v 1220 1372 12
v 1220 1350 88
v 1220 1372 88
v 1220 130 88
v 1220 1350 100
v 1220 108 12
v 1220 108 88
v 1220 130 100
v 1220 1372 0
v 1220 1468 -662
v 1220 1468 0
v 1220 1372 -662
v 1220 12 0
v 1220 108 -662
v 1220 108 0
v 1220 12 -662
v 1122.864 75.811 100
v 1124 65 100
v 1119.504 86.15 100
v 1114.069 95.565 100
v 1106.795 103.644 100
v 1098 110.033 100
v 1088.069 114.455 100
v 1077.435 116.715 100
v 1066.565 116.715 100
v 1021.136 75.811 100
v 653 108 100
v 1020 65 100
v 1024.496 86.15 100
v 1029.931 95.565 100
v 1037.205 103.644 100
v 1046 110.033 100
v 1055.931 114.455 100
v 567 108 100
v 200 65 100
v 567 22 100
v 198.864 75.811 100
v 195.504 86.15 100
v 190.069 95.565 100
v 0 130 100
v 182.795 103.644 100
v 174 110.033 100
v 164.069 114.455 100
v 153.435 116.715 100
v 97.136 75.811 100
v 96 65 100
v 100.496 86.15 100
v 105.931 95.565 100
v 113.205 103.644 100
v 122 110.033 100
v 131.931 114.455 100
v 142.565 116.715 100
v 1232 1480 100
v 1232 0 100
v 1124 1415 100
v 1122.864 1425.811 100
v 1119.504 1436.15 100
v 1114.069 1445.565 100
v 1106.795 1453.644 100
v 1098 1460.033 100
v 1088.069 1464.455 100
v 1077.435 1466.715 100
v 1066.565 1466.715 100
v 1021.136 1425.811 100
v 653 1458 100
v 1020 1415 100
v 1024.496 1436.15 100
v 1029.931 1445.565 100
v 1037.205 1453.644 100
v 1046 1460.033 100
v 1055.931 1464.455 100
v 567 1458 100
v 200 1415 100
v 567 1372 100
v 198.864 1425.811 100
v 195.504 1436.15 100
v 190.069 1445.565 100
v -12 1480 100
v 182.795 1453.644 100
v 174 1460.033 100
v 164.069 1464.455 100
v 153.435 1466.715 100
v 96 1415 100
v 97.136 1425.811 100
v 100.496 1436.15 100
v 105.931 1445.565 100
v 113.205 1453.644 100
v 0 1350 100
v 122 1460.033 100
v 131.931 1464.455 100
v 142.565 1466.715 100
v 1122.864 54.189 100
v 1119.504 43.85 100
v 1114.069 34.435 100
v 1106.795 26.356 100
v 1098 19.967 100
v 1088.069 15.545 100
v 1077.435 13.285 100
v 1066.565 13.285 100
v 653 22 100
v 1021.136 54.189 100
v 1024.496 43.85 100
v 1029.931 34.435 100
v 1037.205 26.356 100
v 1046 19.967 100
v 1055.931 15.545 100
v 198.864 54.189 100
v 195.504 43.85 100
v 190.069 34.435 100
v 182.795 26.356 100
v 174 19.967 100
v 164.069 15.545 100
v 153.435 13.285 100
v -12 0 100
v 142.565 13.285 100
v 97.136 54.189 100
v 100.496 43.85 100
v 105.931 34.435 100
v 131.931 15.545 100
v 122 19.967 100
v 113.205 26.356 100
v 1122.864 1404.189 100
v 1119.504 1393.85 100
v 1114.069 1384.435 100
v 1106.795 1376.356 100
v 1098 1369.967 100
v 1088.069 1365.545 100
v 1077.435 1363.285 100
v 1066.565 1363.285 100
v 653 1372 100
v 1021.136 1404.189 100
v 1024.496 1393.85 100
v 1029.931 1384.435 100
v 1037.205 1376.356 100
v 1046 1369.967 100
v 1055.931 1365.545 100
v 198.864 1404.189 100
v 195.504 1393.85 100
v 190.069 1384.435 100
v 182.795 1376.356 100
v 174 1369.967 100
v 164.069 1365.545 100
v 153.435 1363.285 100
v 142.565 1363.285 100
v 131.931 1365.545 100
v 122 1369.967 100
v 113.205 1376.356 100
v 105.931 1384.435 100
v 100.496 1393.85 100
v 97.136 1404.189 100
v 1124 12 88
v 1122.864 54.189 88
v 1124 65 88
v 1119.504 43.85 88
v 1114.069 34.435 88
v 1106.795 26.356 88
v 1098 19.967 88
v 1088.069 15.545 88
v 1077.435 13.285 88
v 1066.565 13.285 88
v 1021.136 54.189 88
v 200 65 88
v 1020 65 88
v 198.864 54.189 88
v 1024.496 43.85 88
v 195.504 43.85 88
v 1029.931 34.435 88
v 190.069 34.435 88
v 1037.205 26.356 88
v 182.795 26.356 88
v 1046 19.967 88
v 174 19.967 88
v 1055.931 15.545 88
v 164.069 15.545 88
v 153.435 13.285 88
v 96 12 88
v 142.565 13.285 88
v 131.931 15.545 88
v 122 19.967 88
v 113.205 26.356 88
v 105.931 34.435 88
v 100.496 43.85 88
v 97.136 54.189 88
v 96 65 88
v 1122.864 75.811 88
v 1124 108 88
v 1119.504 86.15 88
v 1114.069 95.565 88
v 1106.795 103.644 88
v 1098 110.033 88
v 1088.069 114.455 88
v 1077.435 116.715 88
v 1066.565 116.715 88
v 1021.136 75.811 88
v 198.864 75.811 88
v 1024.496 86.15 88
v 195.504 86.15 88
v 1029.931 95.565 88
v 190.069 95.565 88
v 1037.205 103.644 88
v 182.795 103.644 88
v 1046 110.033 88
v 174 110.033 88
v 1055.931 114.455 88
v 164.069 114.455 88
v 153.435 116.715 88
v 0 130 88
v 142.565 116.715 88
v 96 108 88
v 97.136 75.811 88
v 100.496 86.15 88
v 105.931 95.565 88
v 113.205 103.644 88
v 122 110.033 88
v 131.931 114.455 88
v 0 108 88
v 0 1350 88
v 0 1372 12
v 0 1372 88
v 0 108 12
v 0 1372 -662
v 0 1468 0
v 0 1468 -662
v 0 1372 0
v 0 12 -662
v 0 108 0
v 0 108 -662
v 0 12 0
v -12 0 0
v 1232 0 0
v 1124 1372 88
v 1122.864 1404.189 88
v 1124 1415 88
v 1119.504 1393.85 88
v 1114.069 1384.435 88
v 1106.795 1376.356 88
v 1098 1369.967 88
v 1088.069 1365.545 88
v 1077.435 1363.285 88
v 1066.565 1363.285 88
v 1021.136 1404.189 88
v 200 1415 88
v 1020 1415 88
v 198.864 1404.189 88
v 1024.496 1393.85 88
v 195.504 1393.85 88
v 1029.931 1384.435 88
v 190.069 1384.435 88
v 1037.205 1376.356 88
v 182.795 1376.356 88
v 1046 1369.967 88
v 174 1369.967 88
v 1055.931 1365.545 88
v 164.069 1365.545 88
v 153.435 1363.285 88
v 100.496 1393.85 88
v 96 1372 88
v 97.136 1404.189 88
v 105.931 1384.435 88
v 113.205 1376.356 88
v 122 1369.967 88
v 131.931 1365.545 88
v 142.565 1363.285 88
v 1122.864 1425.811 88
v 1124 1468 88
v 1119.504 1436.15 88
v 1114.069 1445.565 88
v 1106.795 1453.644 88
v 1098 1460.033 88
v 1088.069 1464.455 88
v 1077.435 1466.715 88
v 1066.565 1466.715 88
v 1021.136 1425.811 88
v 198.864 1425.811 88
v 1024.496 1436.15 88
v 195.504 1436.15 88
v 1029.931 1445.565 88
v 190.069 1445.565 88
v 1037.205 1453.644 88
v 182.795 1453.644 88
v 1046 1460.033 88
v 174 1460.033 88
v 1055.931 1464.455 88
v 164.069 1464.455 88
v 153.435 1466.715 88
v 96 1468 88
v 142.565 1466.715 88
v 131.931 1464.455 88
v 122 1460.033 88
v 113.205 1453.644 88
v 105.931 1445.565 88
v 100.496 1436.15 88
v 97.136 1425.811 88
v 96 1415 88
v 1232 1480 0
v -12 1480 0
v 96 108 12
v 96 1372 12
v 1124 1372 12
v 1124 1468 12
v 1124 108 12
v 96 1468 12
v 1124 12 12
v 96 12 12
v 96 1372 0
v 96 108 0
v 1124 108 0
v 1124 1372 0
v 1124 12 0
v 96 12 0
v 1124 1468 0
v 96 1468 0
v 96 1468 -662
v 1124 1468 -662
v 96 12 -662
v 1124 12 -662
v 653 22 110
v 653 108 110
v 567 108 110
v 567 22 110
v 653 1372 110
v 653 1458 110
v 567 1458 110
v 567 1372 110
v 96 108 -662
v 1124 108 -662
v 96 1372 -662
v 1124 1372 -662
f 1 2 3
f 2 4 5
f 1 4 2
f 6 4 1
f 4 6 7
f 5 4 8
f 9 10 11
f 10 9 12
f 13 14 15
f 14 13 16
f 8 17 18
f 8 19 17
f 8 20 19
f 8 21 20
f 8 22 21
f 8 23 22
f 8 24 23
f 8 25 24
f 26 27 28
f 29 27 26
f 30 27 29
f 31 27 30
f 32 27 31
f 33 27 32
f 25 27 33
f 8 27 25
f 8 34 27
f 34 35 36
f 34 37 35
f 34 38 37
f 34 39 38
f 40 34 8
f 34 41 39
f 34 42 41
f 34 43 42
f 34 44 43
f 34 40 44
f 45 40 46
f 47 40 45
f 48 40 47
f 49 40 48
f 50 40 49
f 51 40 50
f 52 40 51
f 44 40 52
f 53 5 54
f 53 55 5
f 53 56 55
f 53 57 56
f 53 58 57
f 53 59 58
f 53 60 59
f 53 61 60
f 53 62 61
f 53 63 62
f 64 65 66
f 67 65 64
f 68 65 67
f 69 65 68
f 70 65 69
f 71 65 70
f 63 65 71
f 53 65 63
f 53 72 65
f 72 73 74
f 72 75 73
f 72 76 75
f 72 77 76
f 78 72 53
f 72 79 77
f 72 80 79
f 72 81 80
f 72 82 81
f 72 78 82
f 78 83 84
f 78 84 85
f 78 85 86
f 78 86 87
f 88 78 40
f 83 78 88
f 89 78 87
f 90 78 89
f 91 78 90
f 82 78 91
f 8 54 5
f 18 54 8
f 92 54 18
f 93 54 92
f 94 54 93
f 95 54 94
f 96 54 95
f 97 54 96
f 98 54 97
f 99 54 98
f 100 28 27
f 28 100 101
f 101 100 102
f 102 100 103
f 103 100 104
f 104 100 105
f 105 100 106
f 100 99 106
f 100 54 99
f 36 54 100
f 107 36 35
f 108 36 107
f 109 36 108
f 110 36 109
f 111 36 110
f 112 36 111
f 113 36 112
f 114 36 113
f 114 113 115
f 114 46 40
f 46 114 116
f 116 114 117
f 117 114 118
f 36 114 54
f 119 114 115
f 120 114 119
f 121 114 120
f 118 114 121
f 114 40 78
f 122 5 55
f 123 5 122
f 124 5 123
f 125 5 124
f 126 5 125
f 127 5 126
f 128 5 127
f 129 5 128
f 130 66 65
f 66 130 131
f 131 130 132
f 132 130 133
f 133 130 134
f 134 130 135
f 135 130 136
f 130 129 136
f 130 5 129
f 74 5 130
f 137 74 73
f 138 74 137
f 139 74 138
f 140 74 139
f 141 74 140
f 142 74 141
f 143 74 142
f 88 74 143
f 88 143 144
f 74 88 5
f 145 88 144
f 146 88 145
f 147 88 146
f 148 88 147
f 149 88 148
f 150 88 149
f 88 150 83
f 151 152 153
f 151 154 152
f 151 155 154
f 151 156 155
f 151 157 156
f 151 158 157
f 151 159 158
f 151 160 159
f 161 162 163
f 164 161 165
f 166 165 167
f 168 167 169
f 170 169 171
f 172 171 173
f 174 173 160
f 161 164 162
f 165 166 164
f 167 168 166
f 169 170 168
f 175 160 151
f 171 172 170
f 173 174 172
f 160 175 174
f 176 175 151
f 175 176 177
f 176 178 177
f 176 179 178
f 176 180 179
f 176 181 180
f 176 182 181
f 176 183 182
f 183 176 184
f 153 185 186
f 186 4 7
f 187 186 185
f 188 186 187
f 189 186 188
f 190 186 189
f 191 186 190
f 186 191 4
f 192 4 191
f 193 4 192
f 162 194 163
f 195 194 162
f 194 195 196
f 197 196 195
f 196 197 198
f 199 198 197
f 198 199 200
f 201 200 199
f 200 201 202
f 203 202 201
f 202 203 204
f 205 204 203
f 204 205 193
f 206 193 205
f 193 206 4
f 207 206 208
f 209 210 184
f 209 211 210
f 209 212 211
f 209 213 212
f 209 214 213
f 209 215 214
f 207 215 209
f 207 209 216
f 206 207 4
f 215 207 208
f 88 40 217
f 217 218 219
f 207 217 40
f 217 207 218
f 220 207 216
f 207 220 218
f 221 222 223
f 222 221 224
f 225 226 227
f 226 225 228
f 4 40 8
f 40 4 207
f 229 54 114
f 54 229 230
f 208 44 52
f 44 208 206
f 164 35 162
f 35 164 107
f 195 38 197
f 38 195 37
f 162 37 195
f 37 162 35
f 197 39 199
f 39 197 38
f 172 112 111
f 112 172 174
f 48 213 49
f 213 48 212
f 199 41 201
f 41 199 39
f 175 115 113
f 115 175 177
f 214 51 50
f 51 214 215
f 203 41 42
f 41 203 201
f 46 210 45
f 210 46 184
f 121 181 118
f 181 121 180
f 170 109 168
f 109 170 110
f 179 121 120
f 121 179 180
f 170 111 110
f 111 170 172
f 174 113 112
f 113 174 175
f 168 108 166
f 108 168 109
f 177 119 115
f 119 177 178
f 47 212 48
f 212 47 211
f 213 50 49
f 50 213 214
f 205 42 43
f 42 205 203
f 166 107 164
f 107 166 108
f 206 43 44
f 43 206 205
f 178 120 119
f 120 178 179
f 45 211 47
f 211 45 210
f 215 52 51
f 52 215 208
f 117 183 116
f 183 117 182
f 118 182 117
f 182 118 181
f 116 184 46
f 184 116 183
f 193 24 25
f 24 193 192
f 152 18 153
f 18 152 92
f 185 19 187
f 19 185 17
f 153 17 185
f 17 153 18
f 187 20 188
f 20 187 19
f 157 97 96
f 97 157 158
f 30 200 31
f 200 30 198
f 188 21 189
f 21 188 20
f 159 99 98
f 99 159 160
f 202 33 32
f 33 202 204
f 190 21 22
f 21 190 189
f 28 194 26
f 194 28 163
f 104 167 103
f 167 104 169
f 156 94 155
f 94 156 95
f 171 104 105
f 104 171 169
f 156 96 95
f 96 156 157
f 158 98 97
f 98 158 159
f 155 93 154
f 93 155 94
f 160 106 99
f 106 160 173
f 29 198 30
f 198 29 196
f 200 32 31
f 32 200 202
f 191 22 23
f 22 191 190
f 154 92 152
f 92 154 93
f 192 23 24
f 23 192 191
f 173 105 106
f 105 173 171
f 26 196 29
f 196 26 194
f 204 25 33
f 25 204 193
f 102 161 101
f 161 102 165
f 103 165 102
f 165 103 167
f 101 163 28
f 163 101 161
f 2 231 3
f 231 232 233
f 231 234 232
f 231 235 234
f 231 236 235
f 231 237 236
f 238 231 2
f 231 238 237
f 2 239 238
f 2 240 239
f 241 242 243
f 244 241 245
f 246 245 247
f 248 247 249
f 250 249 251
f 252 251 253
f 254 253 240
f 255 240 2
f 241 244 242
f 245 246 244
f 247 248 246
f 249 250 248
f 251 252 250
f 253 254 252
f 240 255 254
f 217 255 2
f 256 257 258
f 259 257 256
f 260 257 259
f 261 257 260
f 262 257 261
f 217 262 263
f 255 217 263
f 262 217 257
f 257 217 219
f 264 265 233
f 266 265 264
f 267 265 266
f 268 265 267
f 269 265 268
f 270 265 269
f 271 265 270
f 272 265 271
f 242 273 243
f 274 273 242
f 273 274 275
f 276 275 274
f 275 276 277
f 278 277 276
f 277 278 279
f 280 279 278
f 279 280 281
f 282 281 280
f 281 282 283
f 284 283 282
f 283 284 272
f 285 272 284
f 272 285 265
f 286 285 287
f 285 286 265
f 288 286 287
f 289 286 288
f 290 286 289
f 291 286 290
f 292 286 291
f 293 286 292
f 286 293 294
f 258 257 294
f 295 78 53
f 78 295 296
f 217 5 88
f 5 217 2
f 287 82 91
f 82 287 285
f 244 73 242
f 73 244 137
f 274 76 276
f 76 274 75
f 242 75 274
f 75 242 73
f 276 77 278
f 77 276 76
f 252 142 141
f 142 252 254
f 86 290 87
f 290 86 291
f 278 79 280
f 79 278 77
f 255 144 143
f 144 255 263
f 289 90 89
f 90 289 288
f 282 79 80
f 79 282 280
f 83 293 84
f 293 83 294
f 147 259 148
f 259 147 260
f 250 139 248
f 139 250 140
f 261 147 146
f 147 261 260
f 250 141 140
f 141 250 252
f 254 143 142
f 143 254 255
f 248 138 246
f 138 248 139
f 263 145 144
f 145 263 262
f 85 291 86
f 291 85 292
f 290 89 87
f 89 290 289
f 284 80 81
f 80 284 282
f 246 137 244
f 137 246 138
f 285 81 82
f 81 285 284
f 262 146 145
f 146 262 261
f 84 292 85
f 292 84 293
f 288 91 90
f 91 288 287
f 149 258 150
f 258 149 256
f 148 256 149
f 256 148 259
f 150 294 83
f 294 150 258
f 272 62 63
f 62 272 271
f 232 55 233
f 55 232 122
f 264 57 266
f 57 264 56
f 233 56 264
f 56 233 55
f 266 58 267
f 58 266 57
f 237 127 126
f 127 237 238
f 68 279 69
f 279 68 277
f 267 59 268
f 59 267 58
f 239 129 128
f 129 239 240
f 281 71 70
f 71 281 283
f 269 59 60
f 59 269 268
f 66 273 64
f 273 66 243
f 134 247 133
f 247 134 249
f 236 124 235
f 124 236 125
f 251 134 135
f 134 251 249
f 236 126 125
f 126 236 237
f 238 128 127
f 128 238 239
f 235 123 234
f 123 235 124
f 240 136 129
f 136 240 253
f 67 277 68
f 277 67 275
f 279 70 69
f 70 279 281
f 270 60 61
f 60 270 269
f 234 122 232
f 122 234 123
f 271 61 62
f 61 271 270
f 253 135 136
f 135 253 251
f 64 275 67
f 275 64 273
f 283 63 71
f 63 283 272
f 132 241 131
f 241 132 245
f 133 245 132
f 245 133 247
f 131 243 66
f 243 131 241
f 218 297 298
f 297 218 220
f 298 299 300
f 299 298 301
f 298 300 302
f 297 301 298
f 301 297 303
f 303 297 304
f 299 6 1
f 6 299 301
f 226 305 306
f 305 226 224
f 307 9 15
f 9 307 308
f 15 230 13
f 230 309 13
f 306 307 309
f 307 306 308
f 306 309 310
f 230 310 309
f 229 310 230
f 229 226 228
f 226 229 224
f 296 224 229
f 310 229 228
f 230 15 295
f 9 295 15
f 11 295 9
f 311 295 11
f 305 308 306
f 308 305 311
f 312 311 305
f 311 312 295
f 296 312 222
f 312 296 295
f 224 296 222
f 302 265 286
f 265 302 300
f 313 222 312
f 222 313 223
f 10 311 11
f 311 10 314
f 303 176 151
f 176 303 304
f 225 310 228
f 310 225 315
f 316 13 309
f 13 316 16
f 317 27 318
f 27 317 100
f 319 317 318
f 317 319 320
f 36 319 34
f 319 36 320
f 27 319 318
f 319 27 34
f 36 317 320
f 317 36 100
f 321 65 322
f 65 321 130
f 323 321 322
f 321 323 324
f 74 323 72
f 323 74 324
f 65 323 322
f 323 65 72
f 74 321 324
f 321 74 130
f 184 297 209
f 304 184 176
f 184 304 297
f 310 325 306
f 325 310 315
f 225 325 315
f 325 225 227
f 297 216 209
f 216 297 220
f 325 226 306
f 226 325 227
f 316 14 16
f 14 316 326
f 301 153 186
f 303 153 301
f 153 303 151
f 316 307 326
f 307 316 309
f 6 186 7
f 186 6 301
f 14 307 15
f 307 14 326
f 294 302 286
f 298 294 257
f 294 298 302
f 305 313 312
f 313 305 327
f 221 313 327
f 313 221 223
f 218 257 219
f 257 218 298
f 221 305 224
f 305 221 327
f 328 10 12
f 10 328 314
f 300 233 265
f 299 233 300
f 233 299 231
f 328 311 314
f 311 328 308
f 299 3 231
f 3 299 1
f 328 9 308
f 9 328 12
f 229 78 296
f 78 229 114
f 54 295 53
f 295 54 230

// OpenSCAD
WIDTH=12;
SIZE=1220;
BUF=130;
DEPTH=100;
LEG=[96, 96, 750];

echo(
    SIZE + BUF * 2 - WIDTH * 2 +
    (DEPTH - WIDTH) * 2 + //END
    BUF * 2 + //BUF
    DEPTH * 4 //Sides
);   

translate([0, WIDTH, 0])
    color([.8,.8,.5])
        cube([SIZE, SIZE + BUF * 2 - WIDTH * 2, WIDTH]);
echo("2 × Base:", (SIZE + BUF *2 - WIDTH *2)/2);

//End
translate([0, 0, 0])
    cube([SIZE, WIDTH, DEPTH - WIDTH]);
translate([0, SIZE + BUF *2 - WIDTH, 0])
    cube([SIZE, WIDTH, DEPTH - WIDTH ]);
echo("2 × End:", DEPTH-WIDTH);
//Buf
translate([0, 0, DEPTH - WIDTH])
    difference() {
        cube([SIZE, BUF, WIDTH]);
        translate([BUF*.4+LEG[0], BUF/2, -WIDTH-1])
            cylinder(d=BUF * .8, h=100);
        translate([SIZE - (BUF*.4+LEG[0]), BUF/2, -WIDTH-1])
            cylinder(d=BUF * .8, h=100);
    }

echo("2 × Top:", BUF);

//Buf2
translate([0, SIZE + BUF, DEPTH - WIDTH ])
    difference() {
        cube([SIZE, BUF, WIDTH]);
        translate([BUF*.4+LEG[0], BUF/2, -WIDTH-1])
            cylinder(d=BUF * .8, h=100);
        translate([SIZE - (BUF*.4+LEG[0]), BUF/2, -WIDTH-1])
            cylinder(d=BUF * .8, h=100);
    }


//Plug
translate([SIZE/2-86/2, (BUF-86)/2, DEPTH])
    color([1, 1, 1])
        cube([86, 86, 10]);

translate([SIZE/2-86/2, SIZE + BUF + (BUF-86)/2, DEPTH])
    color([1, 1, 1])
        cube([86, 86, 10]);


//Leg
translate([0, WIDTH, -LEG[2] + DEPTH - WIDTH])
    color([.8,.8,.8])
        cube(LEG);
        
translate([SIZE-LEG[0], WIDTH, -LEG[2] + DEPTH - WIDTH])
    color([.8,.8,.8])
        cube(LEG);
        
translate([0, SIZE + BUF * 2 - WIDTH - LEG[1], -LEG[2] + DEPTH - WIDTH])
    color([.8,.8,.8])
        cube(LEG);
        
translate([SIZE-LEG[0], SIZE + BUF * 2 - WIDTH - LEG[1], -LEG[2] + DEPTH - WIDTH])
    color([.8,.8,.8])
        cube(LEG);
        
 //Side
translate([-WIDTH, 0, 0])
    cube([WIDTH, SIZE/2 + BUF , DEPTH]);
translate([-WIDTH, SIZE/2 + BUF, 0])
    cube([WIDTH, SIZE/2 + BUF , DEPTH]);
    
translate([SIZE, 0, 0])
    cube([WIDTH, SIZE/2 + BUF, DEPTH]);
translate([SIZE, SIZE/2 + BUF, 0])
    cube([WIDTH, SIZE/2 + BUF, DEPTH]);
    
echo("4 × Side:", DEPTH, "×", SIZE/2 + BUF);
